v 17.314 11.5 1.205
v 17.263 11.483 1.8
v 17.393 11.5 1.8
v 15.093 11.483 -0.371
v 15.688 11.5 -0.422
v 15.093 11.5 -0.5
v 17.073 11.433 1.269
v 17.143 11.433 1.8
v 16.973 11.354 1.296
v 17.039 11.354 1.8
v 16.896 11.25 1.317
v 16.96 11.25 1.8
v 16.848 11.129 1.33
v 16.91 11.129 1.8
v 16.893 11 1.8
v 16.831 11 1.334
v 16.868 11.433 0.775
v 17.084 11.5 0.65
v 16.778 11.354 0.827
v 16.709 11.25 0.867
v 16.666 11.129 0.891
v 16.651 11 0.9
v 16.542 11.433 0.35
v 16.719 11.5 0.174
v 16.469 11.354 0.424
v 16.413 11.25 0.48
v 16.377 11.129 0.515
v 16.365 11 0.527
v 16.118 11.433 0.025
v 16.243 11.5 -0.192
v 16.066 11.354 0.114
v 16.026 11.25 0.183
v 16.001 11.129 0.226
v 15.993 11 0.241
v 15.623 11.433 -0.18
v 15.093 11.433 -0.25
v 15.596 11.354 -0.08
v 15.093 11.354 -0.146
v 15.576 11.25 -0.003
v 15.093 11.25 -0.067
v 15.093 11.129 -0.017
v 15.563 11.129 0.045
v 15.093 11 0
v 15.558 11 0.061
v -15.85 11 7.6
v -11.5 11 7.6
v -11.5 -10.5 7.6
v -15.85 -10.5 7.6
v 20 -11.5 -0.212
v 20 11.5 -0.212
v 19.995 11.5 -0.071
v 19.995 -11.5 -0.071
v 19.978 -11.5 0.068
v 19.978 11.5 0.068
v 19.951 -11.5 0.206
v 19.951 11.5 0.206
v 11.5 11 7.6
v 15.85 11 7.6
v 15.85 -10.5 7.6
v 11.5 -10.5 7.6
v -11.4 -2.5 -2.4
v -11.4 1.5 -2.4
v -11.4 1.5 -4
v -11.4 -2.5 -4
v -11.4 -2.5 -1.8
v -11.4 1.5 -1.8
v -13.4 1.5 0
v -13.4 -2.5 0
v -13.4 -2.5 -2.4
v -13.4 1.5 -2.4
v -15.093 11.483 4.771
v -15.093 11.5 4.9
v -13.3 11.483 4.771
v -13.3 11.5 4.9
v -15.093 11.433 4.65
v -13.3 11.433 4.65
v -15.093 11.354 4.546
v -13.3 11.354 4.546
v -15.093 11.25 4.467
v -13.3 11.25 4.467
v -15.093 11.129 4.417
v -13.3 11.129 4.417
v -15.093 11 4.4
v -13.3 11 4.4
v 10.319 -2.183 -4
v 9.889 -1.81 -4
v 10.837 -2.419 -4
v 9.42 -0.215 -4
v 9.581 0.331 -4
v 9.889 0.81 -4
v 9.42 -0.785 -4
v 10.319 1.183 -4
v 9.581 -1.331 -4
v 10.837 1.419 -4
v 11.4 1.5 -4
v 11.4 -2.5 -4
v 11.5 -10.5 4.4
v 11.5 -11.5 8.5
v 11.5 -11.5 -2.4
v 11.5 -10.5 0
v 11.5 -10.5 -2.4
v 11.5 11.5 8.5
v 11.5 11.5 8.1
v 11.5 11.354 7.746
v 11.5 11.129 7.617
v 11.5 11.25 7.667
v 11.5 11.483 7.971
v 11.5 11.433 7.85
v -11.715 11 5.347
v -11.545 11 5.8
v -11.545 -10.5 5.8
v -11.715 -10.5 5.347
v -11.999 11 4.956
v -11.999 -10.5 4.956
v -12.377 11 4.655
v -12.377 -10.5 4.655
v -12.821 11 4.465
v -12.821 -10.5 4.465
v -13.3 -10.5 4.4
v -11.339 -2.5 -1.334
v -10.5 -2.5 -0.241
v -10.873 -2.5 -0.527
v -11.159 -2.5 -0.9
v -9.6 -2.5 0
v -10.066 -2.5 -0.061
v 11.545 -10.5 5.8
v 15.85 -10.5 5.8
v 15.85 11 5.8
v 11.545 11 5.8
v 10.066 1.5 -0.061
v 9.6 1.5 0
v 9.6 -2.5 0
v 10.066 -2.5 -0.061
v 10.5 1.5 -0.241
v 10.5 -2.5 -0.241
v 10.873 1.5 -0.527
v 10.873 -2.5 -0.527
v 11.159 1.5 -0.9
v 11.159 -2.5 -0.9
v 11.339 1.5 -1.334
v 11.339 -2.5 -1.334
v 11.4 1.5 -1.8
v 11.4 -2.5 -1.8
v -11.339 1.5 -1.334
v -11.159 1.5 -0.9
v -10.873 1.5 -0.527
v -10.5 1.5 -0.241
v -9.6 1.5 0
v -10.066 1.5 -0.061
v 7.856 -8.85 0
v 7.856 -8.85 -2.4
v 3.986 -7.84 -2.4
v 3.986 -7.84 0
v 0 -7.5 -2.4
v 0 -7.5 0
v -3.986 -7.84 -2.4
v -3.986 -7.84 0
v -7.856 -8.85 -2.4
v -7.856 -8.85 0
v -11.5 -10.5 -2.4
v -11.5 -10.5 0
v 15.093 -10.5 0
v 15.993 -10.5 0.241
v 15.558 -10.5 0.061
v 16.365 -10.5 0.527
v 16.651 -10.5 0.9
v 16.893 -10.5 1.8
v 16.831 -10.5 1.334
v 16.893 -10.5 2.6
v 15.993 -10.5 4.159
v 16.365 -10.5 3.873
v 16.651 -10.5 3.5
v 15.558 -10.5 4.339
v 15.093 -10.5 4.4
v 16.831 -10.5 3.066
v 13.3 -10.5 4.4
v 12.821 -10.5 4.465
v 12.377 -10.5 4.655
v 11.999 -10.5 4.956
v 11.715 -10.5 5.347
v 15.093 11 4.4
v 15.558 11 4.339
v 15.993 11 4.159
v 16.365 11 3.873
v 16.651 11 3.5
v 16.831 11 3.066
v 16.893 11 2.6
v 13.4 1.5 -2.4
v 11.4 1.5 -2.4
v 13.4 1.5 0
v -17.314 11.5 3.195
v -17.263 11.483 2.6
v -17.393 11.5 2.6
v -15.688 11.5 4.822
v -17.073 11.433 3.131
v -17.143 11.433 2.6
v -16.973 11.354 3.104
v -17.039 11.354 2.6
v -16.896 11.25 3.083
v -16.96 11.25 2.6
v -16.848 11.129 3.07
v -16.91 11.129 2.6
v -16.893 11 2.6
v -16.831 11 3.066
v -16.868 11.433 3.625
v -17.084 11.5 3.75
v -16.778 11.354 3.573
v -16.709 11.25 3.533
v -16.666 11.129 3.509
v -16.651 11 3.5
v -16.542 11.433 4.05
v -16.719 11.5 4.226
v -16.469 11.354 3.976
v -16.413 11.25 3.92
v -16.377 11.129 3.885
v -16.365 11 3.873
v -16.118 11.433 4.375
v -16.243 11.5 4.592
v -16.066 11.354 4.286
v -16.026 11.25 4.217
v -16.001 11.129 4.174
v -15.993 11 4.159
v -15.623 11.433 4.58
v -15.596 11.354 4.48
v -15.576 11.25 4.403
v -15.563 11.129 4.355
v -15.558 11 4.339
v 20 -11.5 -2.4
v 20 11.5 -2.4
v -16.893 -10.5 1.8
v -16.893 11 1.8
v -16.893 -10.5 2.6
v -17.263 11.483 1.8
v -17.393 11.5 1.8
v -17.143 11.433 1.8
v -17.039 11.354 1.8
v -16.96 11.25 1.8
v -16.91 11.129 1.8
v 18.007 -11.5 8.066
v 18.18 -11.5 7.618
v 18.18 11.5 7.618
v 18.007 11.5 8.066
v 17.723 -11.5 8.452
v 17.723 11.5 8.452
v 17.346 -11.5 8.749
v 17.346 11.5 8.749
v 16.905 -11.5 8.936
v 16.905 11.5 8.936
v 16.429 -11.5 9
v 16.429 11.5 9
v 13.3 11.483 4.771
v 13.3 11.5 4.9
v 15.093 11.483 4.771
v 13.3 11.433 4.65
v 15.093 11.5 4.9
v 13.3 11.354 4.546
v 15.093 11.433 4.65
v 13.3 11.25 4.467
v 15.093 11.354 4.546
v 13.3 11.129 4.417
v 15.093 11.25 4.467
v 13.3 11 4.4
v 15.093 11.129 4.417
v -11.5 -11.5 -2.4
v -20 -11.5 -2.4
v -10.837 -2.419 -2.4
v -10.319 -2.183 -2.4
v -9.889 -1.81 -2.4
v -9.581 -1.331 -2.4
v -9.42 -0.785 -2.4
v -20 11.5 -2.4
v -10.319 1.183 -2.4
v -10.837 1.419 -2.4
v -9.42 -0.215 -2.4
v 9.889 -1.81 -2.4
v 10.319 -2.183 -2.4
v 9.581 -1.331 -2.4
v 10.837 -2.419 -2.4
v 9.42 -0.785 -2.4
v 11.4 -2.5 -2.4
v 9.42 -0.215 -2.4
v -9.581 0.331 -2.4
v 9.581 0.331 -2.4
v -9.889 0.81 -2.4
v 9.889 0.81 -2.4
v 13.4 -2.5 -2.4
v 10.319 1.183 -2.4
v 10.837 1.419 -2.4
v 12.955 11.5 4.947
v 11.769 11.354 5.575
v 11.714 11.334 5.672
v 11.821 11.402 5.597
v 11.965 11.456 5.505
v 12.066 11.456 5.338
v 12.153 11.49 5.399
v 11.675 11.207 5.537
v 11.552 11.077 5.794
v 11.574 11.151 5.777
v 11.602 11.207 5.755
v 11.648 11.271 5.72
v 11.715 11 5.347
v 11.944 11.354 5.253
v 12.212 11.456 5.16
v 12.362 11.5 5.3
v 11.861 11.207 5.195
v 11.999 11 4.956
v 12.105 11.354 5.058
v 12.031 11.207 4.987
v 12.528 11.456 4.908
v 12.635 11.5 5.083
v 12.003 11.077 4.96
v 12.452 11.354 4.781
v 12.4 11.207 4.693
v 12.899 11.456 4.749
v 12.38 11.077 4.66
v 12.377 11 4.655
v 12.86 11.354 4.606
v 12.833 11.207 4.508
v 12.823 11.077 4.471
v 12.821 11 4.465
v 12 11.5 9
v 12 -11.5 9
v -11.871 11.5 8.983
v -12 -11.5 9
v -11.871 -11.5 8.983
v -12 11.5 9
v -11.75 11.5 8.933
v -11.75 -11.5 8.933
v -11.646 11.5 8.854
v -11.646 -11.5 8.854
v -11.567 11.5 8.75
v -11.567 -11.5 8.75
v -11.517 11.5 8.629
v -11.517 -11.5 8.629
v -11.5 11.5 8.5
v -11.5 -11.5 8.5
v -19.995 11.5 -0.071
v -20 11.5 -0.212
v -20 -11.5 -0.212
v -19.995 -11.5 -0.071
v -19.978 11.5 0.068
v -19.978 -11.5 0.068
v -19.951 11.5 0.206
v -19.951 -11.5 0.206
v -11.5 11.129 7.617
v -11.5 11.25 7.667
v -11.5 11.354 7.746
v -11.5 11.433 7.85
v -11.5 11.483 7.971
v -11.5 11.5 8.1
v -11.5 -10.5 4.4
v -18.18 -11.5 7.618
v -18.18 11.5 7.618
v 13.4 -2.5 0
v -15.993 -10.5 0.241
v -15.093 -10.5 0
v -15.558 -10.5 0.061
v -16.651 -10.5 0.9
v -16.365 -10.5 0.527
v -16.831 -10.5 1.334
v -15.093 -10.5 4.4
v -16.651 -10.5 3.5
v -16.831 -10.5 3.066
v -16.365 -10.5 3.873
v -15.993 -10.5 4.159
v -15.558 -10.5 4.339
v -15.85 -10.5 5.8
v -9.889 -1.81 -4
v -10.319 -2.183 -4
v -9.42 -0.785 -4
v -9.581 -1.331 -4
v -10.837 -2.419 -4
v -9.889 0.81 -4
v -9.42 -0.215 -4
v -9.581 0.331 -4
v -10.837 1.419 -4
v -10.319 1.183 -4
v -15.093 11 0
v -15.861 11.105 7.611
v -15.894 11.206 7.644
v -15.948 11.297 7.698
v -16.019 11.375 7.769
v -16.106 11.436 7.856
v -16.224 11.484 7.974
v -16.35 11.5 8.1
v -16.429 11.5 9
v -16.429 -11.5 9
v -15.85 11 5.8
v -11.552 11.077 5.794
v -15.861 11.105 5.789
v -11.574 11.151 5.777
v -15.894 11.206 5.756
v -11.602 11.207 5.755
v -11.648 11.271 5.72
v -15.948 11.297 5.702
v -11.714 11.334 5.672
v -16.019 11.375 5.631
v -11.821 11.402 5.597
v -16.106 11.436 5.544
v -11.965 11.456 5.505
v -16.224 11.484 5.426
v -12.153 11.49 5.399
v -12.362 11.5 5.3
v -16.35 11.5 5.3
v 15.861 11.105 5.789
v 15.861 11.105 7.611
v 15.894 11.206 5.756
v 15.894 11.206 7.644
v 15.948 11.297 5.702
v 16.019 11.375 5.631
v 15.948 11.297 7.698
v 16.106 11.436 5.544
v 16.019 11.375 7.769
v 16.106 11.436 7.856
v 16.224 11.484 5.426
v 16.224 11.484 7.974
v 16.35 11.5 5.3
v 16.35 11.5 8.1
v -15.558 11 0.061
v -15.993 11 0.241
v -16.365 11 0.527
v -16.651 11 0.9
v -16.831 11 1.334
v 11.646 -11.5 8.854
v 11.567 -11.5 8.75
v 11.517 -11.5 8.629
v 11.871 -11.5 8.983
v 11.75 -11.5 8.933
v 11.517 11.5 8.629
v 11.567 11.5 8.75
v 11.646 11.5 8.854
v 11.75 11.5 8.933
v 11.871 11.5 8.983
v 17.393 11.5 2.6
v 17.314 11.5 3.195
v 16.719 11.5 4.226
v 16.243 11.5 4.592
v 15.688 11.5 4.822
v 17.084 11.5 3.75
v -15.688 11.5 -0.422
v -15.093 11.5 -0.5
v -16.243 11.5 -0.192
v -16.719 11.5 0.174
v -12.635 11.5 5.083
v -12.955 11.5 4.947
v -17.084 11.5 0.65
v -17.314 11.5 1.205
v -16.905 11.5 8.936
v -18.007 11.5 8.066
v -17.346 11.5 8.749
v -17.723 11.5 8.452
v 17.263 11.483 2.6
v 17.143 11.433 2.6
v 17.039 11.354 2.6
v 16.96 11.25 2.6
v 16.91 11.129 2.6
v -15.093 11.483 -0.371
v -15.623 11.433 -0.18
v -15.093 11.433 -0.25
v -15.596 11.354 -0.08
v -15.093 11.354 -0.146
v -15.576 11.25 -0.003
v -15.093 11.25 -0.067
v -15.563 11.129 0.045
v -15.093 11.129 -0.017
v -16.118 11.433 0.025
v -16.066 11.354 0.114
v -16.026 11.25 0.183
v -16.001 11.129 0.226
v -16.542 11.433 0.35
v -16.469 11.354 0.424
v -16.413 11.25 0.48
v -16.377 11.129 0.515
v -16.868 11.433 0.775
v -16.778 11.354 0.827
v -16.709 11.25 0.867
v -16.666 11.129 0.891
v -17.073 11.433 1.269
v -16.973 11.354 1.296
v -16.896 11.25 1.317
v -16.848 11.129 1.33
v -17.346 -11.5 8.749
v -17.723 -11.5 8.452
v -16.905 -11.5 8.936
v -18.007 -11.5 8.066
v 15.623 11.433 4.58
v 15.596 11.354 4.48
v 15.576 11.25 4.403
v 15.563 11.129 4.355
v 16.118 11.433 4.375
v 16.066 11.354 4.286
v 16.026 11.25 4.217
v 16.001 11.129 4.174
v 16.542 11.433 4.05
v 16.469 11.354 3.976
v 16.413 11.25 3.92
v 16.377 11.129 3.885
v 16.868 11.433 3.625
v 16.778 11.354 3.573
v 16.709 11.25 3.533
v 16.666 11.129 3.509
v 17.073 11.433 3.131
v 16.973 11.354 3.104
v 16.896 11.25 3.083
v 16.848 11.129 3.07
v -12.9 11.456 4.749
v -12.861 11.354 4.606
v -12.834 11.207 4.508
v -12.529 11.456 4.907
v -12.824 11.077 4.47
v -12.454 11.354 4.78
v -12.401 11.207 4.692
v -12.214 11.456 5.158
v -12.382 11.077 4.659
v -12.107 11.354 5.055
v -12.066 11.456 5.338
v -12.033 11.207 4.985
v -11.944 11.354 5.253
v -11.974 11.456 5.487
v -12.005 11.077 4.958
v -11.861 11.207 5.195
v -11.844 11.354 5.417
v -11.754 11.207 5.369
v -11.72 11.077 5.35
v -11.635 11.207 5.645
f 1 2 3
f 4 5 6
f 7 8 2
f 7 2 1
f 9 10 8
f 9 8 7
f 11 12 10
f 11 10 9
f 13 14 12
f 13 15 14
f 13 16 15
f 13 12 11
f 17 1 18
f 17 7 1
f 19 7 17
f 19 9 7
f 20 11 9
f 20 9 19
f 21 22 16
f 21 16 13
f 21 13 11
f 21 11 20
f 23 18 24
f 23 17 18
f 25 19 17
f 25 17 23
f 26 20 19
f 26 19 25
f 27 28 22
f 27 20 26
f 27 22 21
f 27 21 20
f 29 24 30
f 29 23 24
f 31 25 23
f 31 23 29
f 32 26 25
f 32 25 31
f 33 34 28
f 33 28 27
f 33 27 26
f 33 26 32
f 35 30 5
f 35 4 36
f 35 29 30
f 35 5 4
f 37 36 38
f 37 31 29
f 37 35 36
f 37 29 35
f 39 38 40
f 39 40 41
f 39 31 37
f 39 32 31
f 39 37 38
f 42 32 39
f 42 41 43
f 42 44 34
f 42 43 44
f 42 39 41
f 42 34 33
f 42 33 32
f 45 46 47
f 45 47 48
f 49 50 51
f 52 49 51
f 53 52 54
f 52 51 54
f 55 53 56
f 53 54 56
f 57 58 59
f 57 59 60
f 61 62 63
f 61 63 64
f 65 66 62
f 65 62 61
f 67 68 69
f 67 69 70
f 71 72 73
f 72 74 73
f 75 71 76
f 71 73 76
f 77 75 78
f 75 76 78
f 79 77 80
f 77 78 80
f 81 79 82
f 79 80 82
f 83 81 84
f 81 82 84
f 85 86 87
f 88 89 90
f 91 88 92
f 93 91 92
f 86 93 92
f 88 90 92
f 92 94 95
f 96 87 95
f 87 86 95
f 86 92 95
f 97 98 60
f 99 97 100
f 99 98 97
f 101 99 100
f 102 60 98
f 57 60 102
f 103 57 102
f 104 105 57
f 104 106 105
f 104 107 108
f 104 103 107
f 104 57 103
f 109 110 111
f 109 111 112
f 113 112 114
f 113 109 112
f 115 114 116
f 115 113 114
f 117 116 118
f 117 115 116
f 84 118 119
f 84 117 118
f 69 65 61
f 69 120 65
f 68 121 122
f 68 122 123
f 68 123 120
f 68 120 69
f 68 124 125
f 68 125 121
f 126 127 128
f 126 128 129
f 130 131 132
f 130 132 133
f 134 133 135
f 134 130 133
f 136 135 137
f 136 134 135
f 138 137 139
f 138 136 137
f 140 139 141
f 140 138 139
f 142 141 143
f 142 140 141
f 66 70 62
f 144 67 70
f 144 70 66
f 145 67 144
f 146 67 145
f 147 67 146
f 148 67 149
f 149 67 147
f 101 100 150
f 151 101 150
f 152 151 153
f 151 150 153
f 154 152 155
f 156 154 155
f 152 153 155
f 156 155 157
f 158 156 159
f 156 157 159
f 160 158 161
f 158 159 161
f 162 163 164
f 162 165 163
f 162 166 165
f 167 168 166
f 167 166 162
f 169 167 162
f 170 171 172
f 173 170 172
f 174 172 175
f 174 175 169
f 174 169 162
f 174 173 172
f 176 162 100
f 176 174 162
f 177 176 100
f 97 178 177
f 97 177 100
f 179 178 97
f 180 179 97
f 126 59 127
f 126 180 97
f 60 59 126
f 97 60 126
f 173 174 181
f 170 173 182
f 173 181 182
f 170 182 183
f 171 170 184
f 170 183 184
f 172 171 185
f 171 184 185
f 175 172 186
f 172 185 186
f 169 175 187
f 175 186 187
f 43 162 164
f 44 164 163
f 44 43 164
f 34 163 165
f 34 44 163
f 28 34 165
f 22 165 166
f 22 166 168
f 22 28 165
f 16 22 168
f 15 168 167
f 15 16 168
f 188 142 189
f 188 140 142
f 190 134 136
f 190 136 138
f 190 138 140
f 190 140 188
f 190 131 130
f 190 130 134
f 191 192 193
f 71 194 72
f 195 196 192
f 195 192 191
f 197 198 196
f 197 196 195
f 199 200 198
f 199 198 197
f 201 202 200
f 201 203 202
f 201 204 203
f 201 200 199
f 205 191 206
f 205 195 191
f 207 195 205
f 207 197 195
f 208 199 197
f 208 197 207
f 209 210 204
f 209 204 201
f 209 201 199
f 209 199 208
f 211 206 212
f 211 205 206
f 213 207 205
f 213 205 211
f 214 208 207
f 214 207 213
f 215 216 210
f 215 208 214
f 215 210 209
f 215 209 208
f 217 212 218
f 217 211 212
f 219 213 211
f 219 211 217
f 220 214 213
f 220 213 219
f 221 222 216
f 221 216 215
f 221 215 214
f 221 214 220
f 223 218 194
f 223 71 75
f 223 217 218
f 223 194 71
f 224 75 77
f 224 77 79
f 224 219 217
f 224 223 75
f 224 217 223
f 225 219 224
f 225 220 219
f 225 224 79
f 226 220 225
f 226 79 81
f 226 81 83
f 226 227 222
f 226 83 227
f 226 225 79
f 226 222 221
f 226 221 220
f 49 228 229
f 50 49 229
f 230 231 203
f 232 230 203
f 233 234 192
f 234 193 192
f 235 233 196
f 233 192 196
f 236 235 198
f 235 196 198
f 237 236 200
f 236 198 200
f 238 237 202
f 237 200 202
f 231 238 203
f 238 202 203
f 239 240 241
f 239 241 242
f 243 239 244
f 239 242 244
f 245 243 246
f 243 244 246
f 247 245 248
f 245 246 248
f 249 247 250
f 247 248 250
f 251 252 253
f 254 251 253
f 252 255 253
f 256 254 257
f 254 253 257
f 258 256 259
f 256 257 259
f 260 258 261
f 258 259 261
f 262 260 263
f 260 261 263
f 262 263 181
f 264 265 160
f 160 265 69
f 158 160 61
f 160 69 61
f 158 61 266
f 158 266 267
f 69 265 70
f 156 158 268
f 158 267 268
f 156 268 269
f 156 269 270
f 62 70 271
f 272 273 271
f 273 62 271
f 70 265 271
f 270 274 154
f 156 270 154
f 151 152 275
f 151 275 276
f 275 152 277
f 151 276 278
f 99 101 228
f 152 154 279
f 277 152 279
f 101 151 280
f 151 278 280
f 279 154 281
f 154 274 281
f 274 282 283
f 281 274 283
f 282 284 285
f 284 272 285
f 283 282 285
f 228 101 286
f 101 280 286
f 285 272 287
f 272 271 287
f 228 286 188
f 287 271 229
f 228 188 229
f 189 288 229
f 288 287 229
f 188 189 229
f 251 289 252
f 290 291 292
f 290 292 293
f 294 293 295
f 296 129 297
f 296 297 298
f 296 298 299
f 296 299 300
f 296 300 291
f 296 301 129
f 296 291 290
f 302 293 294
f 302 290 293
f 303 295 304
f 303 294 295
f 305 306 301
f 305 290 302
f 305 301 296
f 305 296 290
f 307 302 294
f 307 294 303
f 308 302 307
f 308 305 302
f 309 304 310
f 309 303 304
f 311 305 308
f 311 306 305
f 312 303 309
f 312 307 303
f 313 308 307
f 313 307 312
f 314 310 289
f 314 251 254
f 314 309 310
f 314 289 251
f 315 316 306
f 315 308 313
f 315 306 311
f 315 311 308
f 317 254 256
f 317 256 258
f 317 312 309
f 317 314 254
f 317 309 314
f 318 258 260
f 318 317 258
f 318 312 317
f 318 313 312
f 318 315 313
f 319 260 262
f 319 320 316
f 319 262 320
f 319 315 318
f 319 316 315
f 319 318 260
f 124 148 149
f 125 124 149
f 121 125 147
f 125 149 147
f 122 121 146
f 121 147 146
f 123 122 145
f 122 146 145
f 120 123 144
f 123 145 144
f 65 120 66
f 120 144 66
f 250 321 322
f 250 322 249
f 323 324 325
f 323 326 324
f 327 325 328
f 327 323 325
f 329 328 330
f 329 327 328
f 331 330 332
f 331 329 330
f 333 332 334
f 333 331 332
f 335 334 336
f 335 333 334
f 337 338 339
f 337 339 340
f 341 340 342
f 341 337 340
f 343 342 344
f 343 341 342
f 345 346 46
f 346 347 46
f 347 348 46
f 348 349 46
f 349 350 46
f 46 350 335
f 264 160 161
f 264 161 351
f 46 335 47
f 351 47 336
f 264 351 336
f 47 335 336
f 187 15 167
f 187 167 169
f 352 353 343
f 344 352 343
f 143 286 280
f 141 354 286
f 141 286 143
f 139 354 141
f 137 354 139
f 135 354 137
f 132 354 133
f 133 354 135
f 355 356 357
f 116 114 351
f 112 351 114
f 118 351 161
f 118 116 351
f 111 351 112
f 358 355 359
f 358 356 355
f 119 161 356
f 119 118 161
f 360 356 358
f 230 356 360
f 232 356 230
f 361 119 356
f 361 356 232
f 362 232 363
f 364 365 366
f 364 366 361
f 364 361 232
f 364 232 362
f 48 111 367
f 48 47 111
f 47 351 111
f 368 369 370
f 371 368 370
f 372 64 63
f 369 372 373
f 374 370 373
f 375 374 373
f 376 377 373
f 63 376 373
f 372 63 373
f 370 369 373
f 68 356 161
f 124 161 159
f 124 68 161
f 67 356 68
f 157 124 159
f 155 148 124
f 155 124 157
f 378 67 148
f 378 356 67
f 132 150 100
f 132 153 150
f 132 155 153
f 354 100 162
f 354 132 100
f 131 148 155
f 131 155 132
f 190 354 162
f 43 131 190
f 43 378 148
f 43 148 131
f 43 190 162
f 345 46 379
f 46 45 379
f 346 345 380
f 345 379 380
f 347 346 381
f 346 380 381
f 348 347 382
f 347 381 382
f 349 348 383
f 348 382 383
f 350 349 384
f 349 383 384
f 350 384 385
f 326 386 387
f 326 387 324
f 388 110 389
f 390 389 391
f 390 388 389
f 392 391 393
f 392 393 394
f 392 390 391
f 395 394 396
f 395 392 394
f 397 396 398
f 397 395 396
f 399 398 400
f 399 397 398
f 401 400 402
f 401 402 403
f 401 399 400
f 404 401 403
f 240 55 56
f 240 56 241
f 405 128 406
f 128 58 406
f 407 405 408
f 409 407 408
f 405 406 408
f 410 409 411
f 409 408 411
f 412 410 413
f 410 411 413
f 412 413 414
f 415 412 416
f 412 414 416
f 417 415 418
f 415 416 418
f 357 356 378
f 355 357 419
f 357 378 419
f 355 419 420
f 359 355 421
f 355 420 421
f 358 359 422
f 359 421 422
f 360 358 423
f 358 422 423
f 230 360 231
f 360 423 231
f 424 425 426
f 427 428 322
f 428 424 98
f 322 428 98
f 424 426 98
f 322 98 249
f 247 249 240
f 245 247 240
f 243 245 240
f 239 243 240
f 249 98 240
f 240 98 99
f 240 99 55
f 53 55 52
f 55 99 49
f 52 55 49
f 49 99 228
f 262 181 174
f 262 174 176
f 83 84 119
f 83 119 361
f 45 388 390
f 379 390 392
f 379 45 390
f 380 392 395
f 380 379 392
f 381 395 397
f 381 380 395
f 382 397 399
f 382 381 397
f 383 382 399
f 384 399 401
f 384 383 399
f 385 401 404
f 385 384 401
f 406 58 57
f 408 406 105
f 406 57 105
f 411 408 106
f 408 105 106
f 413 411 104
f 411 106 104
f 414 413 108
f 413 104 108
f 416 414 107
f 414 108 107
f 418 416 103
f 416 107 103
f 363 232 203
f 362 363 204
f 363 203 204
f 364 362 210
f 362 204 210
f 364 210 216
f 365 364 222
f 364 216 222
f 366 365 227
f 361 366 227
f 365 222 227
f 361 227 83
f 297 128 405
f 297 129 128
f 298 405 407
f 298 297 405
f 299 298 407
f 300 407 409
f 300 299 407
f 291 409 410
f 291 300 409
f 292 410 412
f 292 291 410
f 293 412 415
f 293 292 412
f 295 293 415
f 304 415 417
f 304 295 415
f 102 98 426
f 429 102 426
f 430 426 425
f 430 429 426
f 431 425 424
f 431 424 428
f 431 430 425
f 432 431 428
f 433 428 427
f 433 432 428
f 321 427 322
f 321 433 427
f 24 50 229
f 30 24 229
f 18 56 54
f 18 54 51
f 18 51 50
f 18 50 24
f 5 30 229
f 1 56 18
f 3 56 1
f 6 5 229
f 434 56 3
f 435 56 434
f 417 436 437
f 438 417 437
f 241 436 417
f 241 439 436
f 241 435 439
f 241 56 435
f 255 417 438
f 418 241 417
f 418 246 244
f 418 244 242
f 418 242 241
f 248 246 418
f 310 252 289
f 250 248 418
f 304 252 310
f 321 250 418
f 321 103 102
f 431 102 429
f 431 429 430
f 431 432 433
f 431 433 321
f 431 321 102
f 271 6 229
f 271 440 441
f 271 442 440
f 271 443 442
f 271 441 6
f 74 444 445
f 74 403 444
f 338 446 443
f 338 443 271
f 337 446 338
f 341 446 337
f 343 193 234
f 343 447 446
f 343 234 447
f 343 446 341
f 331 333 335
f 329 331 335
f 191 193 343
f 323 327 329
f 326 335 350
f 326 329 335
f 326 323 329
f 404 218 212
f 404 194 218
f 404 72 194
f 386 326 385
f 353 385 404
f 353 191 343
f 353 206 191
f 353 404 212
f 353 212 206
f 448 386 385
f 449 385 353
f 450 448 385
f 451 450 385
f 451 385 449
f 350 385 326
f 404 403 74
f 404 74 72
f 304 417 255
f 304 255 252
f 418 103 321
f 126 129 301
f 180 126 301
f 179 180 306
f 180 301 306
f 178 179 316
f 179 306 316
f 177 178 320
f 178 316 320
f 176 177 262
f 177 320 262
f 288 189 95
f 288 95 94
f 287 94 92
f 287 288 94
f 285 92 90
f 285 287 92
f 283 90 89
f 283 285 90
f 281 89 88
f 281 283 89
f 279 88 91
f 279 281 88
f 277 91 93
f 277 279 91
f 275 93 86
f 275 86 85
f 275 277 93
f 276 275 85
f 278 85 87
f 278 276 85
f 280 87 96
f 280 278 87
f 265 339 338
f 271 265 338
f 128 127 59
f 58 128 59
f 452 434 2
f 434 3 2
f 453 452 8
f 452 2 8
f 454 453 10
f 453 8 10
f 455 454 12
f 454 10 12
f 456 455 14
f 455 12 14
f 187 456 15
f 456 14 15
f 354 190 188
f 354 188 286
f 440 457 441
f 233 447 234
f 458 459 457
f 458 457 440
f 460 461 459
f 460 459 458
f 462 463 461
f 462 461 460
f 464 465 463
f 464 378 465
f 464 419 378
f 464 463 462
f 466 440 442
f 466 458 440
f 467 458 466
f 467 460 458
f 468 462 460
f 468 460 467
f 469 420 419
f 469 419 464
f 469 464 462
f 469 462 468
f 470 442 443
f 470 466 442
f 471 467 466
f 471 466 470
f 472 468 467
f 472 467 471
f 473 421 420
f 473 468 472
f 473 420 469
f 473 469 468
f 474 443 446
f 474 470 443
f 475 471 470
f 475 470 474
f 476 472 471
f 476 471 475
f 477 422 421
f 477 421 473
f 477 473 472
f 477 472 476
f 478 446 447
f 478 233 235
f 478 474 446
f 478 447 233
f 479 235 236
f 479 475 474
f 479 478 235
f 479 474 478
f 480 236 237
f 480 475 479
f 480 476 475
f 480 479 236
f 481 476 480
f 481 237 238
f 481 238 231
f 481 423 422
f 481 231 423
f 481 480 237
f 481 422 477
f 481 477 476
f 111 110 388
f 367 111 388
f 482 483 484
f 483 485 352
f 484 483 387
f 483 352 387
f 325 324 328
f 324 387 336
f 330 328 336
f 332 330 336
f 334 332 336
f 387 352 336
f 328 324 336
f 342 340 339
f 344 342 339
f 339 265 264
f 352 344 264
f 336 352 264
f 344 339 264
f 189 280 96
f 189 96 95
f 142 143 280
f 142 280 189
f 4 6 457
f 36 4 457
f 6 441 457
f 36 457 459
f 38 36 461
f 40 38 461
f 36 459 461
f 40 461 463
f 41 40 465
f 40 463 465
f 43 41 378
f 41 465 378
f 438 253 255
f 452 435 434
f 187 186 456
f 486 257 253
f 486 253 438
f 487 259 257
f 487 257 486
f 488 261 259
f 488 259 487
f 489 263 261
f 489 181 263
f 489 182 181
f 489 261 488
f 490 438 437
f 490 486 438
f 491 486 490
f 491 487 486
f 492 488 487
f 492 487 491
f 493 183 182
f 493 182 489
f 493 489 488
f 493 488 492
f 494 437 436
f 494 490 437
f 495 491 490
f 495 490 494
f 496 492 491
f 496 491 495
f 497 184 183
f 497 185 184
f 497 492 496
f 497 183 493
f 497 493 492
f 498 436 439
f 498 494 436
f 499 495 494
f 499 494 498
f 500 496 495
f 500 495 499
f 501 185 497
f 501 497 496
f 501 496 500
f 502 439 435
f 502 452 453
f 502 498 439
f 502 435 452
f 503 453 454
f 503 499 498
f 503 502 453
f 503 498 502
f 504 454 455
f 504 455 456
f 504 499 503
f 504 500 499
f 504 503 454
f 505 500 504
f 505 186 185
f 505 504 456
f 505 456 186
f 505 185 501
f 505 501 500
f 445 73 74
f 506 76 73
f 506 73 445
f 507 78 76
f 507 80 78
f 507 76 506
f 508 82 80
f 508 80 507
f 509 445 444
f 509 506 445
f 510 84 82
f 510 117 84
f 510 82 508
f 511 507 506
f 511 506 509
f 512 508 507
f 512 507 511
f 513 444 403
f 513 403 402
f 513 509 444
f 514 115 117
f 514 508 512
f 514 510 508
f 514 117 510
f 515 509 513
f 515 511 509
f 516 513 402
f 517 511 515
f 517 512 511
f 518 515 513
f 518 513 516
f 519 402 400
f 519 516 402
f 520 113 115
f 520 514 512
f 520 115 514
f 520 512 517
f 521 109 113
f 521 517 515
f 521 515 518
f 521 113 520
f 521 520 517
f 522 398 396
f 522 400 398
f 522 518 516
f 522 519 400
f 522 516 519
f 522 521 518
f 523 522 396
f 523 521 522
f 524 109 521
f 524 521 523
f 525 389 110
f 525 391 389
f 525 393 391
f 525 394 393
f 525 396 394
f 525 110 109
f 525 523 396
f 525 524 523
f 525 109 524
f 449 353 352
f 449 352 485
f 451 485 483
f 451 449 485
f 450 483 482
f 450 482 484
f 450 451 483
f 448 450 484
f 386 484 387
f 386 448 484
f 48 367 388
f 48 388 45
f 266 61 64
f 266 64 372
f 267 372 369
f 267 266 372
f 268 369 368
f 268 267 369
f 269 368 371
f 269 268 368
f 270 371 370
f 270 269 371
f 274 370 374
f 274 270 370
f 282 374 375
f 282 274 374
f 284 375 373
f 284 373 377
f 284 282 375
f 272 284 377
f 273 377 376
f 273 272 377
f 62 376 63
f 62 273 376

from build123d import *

# Parameters (mm, degrees)
F0_W        = 40
F0_H        = 23
F1_DEPTH    = 2.4
F2_W        = 8.5
F2_H        = 23
F3_DEPTH    = 9
F4_DEPTH    = 4
F5_W        = 4.35
F5_H        = 1.8
F5_W_2      = 5.3926127389
F5_H_2      = 4.4
F6_DEPTH    = 22
F7_DEPTH    = 23.001
F8_T1_DEPTH = 22
F8_T3_DEPTH = 24.0600856157
F8_T5_DEPTH = 30.1032426749
F8_T7_DEPTH = 4
F8_T9_DEPTH = 26.5
F9_R        = 0.5
F11_DEPTH   = 4.001


# Not quite as in the source:
# - a fillet or chamfer that OpenCascade refuses, or shapes differently, is made with other operations: its cross-section is extruded or revolved along the edge and cut away or added


with BuildPart() as f1:
    # F0 (on Top) → F1 (new body)
    with BuildSketch(Plane.XY):
        Rectangle(F0_W, F0_H)
        with BuildLine():
            ThreePointArc((-11.4, 1.5), (-9.4, -0.5), (-11.4, -2.5))
            Line((-11.4, -2.5), (-13.4, -2.5))
            Line((-13.4, -2.5), (-13.4, 1.5))
            Line((-13.4, 1.5), (-11.4, 1.5))
        make_face(mode=Mode.SUBTRACT)
        with BuildLine():
            ThreePointArc((11.4, -2.5), (9.4, -0.5), (11.4, 1.5))
            Line((11.4, 1.5), (13.4, 1.5))
            Line((13.4, 1.5), (13.4, -2.5))
            Line((13.4, -2.5), (11.4, -2.5))
        make_face(mode=Mode.SUBTRACT)
        with BuildLine():
            Line((-11.4, 1.5), (-11.4, -2.5))
            ThreePointArc((-11.4, -2.5), (-9.4, -0.5), (-11.4, 1.5))
        make_face()
        with BuildLine():
            Line((11.4, -2.5), (11.4, 1.5))
            ThreePointArc((11.4, 1.5), (9.4, -0.5), (11.4, -2.5))
        make_face()
    extrude(amount=-F1_DEPTH)

    # F2 (on face) → F3 (join)
    with BuildSketch(Plane.XY):
        with Locations((15.75, 0)):
            Rectangle(F2_W, F2_H)
        with Locations((-15.75, 0)):
            Rectangle(F2_W, F2_H)
    extrude(amount=F3_DEPTH)

    # F0 (on Top) → F4 (join)
    with BuildSketch(Plane.XY):
        with BuildLine():
            Line((-11.4, 1.5), (-11.4, -2.5))
            ThreePointArc((-11.4, -2.5), (-9.4, -0.5), (-11.4, 1.5))
        make_face()
        with BuildLine():
            Line((11.4, -2.5), (11.4, 1.5))
            ThreePointArc((11.4, 1.5), (9.4, -0.5), (11.4, -2.5))
        make_face()
    extrude(amount=-F4_DEPTH)

    # F5 (on face) → F6 (cut)
    with BuildSketch(Plane(origin=(0, 11.5, 0), x_dir=(-1, 0, 0), z_dir=(0, 1, 0))):
        with Locations((-13.675, 6.7)):
            Rectangle(F5_W, F5_H)
        with Locations((13.675, 6.7)):
            Rectangle(F5_W, F5_H)
        with Locations((14.1963063695, 2.2)):
            Rectangle(F5_W_2, F5_H_2)
        with Locations((-14.1963063695, 2.2)):
            Rectangle(F5_W_2, F5_H_2)
    extrude(amount=-F6_DEPTH, mode=Mode.SUBTRACT)

    # F5 (on face) → F7 (cut, through all)
    with BuildSketch(Plane(origin=(0, 11.5, 0), x_dir=(-1, 0, 0), z_dir=(0, 1, 0))):
        Polygon((-20, 0), (-17.85, 9), (-20, 9), align=None)
        Polygon((20, 9), (17.85, 9), (20, 0), align=None)
    extrude(amount=-F7_DEPTH, mode=Mode.SUBTRACT)

    # F8: fillet of radius 1.8 on 12 edges, made by hand

    # F8_s2 → F8_t1 (join)
    with BuildSketch(Plane.XZ.offset(-11.5)):
        with BuildLine():
            ThreePointArc((15.0926127389, 0), (16.3654049451, 0.5272077939), (16.8926127389, 1.8))
            Line((16.8926127389, 1.8), (16.8926127389, 0))
            Line((16.8926127389, 0), (15.0926127389, 0))
        make_face()
        with BuildLine():
            ThreePointArc((15.0926127389, 4.4), (16.3654049451, 3.8727922061), (16.8926127389, 2.6))
            Line((16.8926127389, 2.6), (16.8926127389, 4.4))
            Line((16.8926127389, 4.4), (15.0926127389, 4.4))
        make_face()
        with BuildLine():
            ThreePointArc((-16.8926127389, 2.6), (-16.3654049451, 3.8727922061), (-15.0926127389, 4.4))
            Line((-15.0926127389, 4.4), (-16.8926127389, 4.4))
            Line((-16.8926127389, 4.4), (-16.8926127389, 2.6))
        make_face()
        with BuildLine():
            ThreePointArc((-15.0926127389, 0), (-16.3654049451, 0.5272077939), (-16.8926127389, 1.8))
            Line((-16.8926127389, 1.8), (-16.8926127389, 0))
            Line((-16.8926127389, 0), (-15.0926127389, 0))
        make_face()
    extrude(amount=F8_T1_DEPTH)

    # F8_s4 → F8_t3 (cut)
    with BuildSketch(Plane.XZ.offset(-12.0300428079)):
        with BuildLine():
            ThreePointArc((20, -0.2120171231), (19.987641981, -0.0014556176), (19.9507376137, 0.2062146401))
            Line((19.9507376137, 0.2062146401), (20, 0))
            Line((20, 0), (20, -0.2120171231))
        make_face()
        with BuildLine():
            ThreePointArc((-20, -0.2120171231), (-19.987641981, -0.0014556176), (-19.9507376137, 0.2062146401))
            Line((-19.9507376137, 0.2062146401), (-20, 0))
            Line((-20, 0), (-20, -0.2120171231))
        make_face()
    extrude(amount=F8_T3_DEPTH, mode=Mode.SUBTRACT)

    # F8_s6 → F8_t5 (cut)
    with BuildSketch(Plane.XZ.offset(-15.0516213374)):
        with BuildLine():
            ThreePointArc((18.1800890788, 7.6182317633), (17.5445157637, 8.6129432356), (16.429351465, 9))
            Line((16.429351465, 9), (17.85, 9))
            Line((17.85, 9), (18.1800890788, 7.6182317633))
        make_face()
        with BuildLine():
            ThreePointArc((-18.1800890788, 7.6182317633), (-17.5445157637, 8.6129432356), (-16.429351465, 9))
            Line((-16.429351465, 9), (-17.85, 9))
            Line((-17.85, 9), (-18.1800890788, 7.6182317633))
        make_face()
    extrude(amount=F8_T5_DEPTH, mode=Mode.SUBTRACT)

    # F8_s8 → F8_t7 (cut)
    with BuildSketch(Plane.XZ.offset(-1.5)):
        with BuildLine():
            ThreePointArc((-9.6, 0), (-10.8727922061, -0.5272077939), (-11.4, -1.8))
            Line((-11.4, -1.8), (-11.4, 0))
            Line((-11.4, 0), (-9.6, 0))
        make_face()
        with BuildLine():
            ThreePointArc((9.6, 0), (10.8727922061, -0.5272077939), (11.4, -1.8))
            Line((11.4, -1.8), (11.4, 0))
            Line((11.4, 0), (9.6, 0))
        make_face()
    extrude(amount=F8_T7_DEPTH, mode=Mode.SUBTRACT)

    # F8_s10 → F8_t9 (cut)
    with BuildSketch(Plane.XZ.offset(-16)):
        with BuildLine():
            ThreePointArc((-11.5, 6.2), (-12.0272077939, 4.9272077939), (-13.3, 4.4))
            Line((-13.3, 4.4), (-11.5, 4.4))
            Line((-11.5, 4.4), (-11.5, 6.2))
        make_face()
        with BuildLine():
            ThreePointArc((11.5, 6.2), (12.0272077939, 4.9272077939), (13.3, 4.4))
            Line((13.3, 4.4), (11.5, 4.4))
            Line((11.5, 4.4), (11.5, 6.2))
        make_face()
    extrude(amount=F8_T9_DEPTH, mode=Mode.SUBTRACT)

    # F9
    f9_edges = [f1.edges().sort_by_distance(p)[0] for p in [
        (-15.85, 11.5, 6.7),
        (-13.675, 11.5, 7.6),
        (-13.697504, 11.5, 5.8),
        (13.697504, 11.5, 5.8),
        (13.675, 11.5, 7.6),
        (15.85, 11.5, 6.7),
        (11.5, 0, 9),
        (-11.5, 0, 9),
        (0, 11.5, 0),
        (12.177503, 11.5, 4.792875),
        (14.196306, 11.5, 4.4),
        (16.365405, 11.5, 3.872792),
        (16.892613, 11.5, 2.2),
        (16.365405, 11.5, 0.527208),
        (-16.365405, 11.5, 0.527208),
        (-16.892613, 11.5, 2.2),
        (-16.365405, 11.5, 3.872792),
        (-14.196306, 11.5, 4.4),
        (-12.177503, 11.5, 4.792875),
    ]]
    fillet(f9_edges, radius=F9_R)

    # F10 (on face) → F11 (cut, through all)
    with BuildSketch(Plane.XY):
        with BuildLine():
            Line((11.5, -11.5), (11.5, -10.5))
            ThreePointArc((11.5, -10.5), (0, -7.5), (-11.5, -10.5))
            Line((-11.5, -10.5), (-11.5, -11.5))
            Line((-11.5, -11.5), (11.5, -11.5))
        make_face()
    extrude(amount=-F11_DEPTH, mode=Mode.SUBTRACT)


solid = f1.part
